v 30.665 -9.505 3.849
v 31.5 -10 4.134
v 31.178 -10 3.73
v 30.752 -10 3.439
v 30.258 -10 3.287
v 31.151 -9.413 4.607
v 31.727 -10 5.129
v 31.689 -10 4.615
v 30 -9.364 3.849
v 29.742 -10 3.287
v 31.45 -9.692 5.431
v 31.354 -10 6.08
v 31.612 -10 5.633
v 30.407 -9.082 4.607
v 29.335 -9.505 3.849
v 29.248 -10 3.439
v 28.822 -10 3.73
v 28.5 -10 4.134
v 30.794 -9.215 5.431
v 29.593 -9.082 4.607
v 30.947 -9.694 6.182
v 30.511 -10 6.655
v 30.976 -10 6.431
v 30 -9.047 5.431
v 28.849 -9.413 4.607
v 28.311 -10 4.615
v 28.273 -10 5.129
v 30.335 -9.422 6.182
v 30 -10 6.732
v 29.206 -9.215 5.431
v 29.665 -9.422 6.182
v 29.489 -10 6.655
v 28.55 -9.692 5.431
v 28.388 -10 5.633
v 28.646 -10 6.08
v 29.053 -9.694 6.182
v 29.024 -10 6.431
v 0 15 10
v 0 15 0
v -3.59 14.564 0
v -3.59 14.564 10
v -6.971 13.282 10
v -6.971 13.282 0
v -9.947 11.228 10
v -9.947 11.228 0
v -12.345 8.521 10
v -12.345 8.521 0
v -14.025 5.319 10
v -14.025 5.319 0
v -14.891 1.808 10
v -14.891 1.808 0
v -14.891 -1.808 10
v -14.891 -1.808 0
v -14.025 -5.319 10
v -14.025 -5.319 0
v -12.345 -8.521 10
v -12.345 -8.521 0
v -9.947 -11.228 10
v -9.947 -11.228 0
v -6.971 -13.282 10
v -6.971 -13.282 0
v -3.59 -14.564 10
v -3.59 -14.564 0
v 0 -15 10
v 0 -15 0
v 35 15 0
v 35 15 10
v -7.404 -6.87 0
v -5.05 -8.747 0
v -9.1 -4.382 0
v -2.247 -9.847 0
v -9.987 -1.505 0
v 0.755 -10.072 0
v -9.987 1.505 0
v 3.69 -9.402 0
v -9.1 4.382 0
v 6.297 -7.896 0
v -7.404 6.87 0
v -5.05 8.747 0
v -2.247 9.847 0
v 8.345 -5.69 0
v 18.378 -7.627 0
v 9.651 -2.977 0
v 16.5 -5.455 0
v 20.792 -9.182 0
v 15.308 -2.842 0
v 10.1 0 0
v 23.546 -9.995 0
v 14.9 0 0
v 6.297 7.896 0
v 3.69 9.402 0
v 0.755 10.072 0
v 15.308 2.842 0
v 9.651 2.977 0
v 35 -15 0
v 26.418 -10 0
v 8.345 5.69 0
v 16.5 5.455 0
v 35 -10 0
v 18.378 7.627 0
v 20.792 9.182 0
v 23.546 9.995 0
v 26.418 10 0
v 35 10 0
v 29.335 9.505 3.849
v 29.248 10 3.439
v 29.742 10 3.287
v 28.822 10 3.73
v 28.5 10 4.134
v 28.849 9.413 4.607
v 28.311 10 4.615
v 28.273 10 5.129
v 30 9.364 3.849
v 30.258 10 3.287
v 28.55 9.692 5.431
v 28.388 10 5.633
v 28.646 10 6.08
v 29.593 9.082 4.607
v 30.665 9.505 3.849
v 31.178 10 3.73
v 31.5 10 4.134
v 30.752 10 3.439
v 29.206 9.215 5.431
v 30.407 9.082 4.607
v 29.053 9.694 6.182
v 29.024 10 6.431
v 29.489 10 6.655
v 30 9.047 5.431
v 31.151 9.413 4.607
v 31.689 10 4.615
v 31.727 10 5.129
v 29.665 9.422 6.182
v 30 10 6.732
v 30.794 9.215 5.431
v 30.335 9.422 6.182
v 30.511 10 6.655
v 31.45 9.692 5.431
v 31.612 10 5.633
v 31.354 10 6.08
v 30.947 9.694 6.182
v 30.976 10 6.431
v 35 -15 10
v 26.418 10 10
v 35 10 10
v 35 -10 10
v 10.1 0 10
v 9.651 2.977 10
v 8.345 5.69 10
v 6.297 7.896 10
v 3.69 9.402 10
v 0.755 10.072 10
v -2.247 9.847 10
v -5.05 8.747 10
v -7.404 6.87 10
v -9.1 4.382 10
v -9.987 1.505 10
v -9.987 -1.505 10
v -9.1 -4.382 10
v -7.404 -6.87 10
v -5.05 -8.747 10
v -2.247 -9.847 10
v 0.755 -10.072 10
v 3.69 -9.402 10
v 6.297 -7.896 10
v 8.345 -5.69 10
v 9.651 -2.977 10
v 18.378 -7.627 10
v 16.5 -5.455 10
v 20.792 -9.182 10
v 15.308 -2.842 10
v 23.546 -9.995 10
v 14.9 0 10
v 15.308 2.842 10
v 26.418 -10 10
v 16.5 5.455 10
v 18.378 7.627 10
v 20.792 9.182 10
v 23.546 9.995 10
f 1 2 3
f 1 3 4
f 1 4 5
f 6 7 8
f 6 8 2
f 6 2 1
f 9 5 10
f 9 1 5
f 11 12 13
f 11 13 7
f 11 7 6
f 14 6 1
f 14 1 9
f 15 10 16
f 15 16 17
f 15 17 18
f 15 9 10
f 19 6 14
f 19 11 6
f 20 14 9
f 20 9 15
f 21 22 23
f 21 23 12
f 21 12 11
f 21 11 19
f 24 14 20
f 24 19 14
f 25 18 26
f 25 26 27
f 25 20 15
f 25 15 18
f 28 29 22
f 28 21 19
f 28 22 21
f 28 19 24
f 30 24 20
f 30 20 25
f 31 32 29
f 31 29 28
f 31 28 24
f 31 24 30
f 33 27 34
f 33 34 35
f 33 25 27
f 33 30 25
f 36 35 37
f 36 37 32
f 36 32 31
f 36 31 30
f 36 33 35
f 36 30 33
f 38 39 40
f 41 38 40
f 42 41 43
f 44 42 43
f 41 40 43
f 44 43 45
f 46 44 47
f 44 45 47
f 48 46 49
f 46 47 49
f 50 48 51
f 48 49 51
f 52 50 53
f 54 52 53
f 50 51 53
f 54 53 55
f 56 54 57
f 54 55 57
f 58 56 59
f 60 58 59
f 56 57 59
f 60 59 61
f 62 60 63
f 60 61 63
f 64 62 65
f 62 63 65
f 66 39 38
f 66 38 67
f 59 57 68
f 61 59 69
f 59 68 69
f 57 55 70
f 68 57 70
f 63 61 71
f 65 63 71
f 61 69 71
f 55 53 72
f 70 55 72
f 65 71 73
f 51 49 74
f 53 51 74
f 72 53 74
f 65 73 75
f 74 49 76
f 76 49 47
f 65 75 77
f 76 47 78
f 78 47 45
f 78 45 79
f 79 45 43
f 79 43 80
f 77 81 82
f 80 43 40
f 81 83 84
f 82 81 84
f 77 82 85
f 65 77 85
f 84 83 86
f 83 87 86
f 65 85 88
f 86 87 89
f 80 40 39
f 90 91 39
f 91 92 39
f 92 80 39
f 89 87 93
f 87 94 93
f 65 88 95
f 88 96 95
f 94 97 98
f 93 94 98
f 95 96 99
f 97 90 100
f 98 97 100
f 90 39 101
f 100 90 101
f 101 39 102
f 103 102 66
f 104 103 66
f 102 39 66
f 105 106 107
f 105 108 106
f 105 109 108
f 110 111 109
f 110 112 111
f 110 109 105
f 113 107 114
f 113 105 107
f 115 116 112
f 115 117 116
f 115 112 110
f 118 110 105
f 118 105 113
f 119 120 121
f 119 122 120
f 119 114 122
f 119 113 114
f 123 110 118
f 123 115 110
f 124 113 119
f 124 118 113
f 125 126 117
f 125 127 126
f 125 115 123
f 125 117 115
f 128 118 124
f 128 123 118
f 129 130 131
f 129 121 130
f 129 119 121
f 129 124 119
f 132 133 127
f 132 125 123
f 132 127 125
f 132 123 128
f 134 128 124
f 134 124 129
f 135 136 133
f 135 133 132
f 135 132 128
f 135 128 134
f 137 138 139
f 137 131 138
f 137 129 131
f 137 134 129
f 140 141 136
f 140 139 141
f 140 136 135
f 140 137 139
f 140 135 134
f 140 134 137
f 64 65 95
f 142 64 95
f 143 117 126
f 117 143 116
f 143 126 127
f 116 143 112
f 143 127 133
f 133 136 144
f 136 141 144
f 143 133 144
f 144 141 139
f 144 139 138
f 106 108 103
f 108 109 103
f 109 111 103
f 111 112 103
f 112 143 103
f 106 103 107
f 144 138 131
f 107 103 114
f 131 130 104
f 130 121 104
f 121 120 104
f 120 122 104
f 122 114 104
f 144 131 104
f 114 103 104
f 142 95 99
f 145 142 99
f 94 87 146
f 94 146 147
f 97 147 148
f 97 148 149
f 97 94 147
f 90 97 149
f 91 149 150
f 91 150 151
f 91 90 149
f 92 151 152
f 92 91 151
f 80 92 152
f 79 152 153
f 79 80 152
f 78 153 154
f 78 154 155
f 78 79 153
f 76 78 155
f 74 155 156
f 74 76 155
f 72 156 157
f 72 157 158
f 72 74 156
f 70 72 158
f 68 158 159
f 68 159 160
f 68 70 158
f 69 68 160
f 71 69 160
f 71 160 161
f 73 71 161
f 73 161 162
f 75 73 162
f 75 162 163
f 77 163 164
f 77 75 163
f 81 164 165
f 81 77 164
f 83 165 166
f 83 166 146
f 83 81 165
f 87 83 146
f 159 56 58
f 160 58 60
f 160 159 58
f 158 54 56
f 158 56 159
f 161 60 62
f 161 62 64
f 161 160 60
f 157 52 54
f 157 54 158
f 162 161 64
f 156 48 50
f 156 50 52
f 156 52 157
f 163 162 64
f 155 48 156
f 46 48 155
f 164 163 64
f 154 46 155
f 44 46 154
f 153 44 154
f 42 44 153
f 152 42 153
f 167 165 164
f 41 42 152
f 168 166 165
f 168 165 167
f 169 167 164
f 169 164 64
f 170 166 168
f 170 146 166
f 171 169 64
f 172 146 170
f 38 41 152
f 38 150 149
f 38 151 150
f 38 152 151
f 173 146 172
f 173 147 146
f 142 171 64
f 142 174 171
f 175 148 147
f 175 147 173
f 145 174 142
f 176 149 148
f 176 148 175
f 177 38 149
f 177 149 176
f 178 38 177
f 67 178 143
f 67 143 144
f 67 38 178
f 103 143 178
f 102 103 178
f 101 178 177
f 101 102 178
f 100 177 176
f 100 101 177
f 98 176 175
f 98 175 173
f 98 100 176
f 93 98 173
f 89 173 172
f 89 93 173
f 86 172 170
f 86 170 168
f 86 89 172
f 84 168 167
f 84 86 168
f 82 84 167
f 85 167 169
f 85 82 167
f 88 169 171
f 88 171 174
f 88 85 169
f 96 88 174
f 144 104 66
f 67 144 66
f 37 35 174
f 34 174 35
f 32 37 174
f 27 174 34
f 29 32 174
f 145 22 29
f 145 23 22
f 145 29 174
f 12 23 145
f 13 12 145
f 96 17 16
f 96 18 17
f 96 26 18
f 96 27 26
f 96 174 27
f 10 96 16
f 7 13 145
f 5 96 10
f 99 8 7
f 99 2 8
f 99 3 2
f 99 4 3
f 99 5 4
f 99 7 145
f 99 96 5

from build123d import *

# Parameters (mm, degrees)
CYLINDER002_R     = 10.1
CYLINDER002_DEPTH = 10
BOX001_W          = 10
BOX001_H          = 20
BOX001_DEPTH      = 10
CYLINDER001_R     = 10.1
CYLINDER001_DEPTH = 10
BOX_W             = 35
BOX_H             = 30
BOX_DEPTH         = 10
CYLINDER_R        = 15
CYLINDER_DEPTH    = 10


with BuildPart() as sphere:
    # Sphere → Sphere (revolve)
    with BuildSketch(Plane(origin=(30, 11, 5), x_dir=(1, 0, 0), z_dir=(0, -1, 0))):
        with BuildLine():
            ThreePointArc((0, -2), (2, 0), (0, 2))
            Line((0, 2), (0, -2))
        make_face()
    revolve(axis=Axis((30, 11, 5), (0, 0, 1)))


with BuildPart() as cylinder002:
    # Cylinder002 → Cylinder002 (new body)
    with BuildSketch(Plane(origin=(25, 0, 0), x_dir=(1, 0, 0), z_dir=(0, 0, 1))):
        Circle(CYLINDER002_R)
    extrude(amount=CYLINDER002_DEPTH)


with BuildPart() as cube001:
    # Box001 → Box001 (new body)
    with BuildSketch(Plane(origin=(25, -10, 0), x_dir=(1, 0, 0), z_dir=(0, 0, 1))):
        with Locations((5, 10)):
            Rectangle(BOX001_W, BOX001_H)
    extrude(amount=BOX001_DEPTH)


with BuildPart() as negative_fusion:
    # Cylinder001 → Cylinder001 (new body)
    with BuildSketch(Plane.XY):
        Circle(CYLINDER001_R)
    extrude(amount=CYLINDER001_DEPTH)

    # Fusion001: union Cylinder002, Cube001
    add(cylinder002.part)
    add(cube001.part)


with BuildPart() as cube:
    # Box → Box (new body)
    with BuildSketch(Plane(origin=(0, -15, 0), x_dir=(1, 0, 0), z_dir=(0, 0, 1))):
        with Locations((17.5, 15)):
            Rectangle(BOX_W, BOX_H)
    extrude(amount=BOX_DEPTH)


with BuildPart() as cut:
    # Cylinder → Cylinder (new body)
    with BuildSketch(Plane.XY):
        Circle(CYLINDER_R)
    extrude(amount=CYLINDER_DEPTH)

    # Fusion: union Cube
    add(cube.part)

    # Cut: cut Negative Fusion
    add(negative_fusion.part, mode=Mode.SUBTRACT)


with BuildPart() as fusion002:
    # Sphere001 → Sphere001 (revolve)
    with BuildSketch(Plane(origin=(30, -11, 5), x_dir=(1, 0, 0), z_dir=(0, -1, 0))):
        with BuildLine():
            ThreePointArc((0, -2), (2, 0), (0, 2))
            Line((0, 2), (0, -2))
        make_face()
    revolve(axis=Axis((30, -11, 5), (0, 0, 1)))

    # Fusion002: union Sphere, Cut
    add(sphere.part)
    add(cut.part)


solid = fusion002.part
